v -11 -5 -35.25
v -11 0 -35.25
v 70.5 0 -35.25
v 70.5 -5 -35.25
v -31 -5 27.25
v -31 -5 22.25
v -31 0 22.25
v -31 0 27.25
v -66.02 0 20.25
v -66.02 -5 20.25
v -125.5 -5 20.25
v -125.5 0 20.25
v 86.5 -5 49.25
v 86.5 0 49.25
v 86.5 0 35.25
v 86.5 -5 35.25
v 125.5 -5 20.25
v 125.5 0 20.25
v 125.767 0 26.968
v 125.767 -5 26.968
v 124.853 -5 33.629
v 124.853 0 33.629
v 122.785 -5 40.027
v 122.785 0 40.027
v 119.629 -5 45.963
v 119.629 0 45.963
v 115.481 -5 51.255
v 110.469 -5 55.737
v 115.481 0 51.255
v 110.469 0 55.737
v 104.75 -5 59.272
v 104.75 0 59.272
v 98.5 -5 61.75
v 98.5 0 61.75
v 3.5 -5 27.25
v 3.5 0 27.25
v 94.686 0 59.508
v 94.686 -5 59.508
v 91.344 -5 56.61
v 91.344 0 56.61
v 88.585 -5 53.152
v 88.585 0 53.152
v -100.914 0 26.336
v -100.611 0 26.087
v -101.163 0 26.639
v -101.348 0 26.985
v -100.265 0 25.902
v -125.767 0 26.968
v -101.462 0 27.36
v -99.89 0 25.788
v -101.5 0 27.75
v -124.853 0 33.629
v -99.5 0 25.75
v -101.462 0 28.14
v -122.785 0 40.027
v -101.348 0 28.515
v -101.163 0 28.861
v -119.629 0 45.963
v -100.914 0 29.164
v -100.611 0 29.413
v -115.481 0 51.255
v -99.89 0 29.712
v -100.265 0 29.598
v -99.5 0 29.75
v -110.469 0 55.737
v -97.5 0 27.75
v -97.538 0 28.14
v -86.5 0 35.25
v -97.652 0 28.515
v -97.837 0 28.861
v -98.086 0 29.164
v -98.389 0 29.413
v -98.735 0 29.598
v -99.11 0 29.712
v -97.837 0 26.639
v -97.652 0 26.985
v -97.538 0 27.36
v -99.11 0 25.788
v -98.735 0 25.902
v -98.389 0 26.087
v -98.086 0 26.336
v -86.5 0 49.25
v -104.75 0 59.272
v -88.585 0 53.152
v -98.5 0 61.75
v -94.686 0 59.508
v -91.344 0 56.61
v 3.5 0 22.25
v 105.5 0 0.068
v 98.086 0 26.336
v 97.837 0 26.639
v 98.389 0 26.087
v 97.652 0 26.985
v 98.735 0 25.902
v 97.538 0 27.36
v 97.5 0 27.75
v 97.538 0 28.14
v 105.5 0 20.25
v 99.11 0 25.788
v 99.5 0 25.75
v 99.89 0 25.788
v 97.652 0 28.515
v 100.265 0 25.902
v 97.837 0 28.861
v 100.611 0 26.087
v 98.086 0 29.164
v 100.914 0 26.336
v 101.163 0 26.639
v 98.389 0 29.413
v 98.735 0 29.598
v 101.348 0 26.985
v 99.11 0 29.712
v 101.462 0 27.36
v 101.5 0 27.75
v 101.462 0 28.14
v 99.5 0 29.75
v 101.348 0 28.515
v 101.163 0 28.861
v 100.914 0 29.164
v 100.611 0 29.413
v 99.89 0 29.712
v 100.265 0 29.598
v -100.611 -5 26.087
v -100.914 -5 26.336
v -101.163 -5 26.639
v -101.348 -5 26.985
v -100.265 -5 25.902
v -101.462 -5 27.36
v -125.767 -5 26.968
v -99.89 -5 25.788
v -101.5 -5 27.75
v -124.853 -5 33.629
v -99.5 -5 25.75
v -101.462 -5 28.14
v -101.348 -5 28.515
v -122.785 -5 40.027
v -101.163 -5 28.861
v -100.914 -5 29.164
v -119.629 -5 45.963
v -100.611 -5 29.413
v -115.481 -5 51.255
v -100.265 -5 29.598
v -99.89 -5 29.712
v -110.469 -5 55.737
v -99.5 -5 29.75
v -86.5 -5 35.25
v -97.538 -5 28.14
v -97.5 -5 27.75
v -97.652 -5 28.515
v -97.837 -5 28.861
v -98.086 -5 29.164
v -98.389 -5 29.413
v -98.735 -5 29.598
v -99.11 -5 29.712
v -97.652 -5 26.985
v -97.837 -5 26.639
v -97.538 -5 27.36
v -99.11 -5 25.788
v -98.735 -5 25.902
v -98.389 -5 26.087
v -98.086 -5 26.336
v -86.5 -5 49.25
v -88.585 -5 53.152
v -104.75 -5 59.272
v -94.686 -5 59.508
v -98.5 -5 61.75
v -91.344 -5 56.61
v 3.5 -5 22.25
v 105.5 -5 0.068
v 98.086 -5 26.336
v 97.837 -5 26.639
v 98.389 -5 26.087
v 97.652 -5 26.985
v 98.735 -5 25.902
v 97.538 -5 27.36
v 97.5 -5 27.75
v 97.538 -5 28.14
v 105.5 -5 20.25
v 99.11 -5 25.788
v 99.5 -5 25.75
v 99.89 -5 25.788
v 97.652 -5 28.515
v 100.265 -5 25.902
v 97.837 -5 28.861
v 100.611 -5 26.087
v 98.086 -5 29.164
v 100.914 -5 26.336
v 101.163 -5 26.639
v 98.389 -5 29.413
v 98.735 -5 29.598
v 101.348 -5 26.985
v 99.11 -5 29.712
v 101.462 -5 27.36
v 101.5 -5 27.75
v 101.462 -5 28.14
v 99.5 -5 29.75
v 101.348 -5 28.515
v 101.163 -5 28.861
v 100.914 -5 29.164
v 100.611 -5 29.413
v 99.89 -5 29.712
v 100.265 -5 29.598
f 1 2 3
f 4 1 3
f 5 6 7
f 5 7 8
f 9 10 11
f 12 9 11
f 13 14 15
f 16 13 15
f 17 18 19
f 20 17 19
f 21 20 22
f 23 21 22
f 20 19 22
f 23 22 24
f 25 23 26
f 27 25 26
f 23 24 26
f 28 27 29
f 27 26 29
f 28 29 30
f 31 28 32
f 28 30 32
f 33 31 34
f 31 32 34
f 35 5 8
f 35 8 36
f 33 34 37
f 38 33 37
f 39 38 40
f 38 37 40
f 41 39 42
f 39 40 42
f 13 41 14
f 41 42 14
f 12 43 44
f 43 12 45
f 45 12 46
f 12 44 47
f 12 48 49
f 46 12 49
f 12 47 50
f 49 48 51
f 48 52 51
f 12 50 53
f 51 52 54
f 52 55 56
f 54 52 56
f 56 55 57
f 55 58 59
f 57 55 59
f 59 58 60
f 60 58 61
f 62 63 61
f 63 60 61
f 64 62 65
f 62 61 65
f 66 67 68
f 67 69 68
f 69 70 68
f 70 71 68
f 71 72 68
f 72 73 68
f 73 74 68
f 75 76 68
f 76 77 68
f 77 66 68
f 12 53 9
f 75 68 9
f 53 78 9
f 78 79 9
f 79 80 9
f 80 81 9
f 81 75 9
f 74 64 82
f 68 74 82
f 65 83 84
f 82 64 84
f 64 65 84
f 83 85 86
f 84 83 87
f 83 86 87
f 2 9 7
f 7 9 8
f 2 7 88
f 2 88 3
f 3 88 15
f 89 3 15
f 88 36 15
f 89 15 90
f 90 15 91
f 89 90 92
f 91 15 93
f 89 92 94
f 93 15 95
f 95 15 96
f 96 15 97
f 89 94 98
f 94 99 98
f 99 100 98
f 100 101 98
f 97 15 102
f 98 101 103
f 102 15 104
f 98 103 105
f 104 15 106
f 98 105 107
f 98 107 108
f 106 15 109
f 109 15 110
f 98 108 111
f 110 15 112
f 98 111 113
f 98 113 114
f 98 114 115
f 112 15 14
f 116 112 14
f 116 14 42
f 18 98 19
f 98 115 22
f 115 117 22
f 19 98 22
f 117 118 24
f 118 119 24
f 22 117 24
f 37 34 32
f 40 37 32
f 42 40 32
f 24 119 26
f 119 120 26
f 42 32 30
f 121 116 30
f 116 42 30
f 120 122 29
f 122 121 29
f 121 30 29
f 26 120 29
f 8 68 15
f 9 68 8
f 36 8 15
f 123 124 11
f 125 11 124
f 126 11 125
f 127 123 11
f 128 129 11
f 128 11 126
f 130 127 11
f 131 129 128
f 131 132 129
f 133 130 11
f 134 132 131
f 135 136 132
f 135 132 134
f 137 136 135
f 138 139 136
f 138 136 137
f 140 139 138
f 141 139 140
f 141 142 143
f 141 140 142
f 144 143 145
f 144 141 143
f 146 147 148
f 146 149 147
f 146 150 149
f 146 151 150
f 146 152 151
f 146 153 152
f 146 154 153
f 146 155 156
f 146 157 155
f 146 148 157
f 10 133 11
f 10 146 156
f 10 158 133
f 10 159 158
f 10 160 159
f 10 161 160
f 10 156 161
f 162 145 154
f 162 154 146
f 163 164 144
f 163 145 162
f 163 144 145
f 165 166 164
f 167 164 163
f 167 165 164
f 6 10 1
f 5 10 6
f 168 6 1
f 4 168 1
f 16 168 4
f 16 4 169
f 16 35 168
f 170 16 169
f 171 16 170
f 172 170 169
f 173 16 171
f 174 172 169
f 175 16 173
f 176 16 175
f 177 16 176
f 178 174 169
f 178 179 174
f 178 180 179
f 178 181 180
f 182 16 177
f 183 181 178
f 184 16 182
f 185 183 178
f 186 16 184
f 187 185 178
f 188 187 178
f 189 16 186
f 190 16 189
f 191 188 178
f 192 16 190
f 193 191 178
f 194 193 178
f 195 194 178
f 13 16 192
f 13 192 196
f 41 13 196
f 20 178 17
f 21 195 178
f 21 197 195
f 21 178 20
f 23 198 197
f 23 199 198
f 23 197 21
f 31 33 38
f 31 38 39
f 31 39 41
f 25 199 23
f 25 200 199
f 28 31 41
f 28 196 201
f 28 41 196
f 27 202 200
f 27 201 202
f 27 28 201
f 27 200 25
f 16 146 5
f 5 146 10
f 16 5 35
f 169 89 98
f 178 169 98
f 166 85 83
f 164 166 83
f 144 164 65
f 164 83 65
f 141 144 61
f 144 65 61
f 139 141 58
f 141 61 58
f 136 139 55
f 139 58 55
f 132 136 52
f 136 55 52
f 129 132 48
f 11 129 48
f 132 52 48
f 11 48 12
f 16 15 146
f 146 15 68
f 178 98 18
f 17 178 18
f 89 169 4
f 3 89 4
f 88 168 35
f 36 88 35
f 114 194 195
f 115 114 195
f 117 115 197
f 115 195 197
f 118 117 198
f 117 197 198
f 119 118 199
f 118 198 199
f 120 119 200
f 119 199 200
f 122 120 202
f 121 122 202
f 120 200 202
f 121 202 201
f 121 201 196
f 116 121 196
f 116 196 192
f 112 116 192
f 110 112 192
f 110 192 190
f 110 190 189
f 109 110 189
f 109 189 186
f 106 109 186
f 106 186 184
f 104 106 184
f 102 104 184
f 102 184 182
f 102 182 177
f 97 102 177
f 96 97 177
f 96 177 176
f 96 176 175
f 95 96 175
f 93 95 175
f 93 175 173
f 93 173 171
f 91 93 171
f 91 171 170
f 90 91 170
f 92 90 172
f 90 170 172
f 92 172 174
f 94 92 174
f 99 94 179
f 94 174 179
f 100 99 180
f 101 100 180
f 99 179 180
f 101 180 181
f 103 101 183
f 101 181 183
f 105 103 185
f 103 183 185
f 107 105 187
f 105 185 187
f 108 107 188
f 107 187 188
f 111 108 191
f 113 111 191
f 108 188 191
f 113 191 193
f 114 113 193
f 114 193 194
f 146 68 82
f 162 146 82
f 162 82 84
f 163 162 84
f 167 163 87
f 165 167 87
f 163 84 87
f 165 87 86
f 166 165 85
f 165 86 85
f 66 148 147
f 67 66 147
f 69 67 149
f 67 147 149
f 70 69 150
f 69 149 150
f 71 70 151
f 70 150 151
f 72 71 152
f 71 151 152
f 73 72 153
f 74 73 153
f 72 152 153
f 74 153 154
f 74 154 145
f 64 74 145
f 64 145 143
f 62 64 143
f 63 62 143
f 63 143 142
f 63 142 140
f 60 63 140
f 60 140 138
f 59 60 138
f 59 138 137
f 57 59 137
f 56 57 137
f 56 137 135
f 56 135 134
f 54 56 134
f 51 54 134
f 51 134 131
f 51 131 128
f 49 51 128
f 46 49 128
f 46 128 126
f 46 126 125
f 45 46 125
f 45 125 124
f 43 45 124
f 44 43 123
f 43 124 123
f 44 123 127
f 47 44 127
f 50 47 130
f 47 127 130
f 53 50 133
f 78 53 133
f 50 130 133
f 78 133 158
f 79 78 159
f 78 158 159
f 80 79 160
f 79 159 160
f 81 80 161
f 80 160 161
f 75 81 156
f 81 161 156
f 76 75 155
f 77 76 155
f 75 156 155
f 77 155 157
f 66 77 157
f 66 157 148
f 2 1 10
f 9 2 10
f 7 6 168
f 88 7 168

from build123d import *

# Parameters (mm, degrees)
F1_DEPTH = 5
F2_W     = 34.5
F2_H     = 5
F3_DEPTH = 25
F4_R     = 2
F5_DEPTH = 25


with BuildPart() as f1:
    # F0 (on Front) → F1 (new body)
    with BuildSketch(Plane.XZ):
        with BuildLine():
            Line((-105.5, 20.25), (-105.5, 35.25))
            Line((-105.5, 35.25), (-86.5, 35.25))
            Line((-86.5, 35.25), (-86.5, 49.25))
            ThreePointArc((-86.5, 49.25), (-91.344095, 56.609669), (-98.5, 61.75))
            ThreePointArc((-98.5, 61.75), (-119.628789, 45.963308), (-125.5, 20.25))
            Line((-125.5, 20.25), (-105.5, 20.25))
        make_face()
        Polygon((-86.5, 35.25), (-105.5, 35.25), (-105.5, 20.25), (-105.5, -35.25), (105.5, -35.25), (105.5, 20.25), (105.5, 35.25), (86.5, 35.25), align=None)
        with BuildLine():
            Line((86.5, 49.25), (86.5, 35.25))
            Line((86.5, 35.25), (105.5, 35.25))
            Line((105.5, 35.25), (105.5, 20.25))
            Line((105.5, 20.25), (125.5, 20.25))
            ThreePointArc((125.5, 20.25), (119.628789, 45.963308), (98.5, 61.75))
            ThreePointArc((98.5, 61.75), (91.344095, 56.609669), (86.5, 49.25))
        make_face()
    extrude(amount=F1_DEPTH)

    # F2 (on face) → F3 (cut)
    with BuildSketch(Plane.XZ.offset(5)):
        Polygon((125.5, 20.25), (70.5, -35.25), (119.704917, -35.25), align=None)
        Polygon((-105.5, -35.25), (-11, -35.25), (-66.019693, 20.25), (-105.5, 20.25), align=None)
        with Locations((-13.75, 24.75)):
            Rectangle(F2_W, F2_H)
    extrude(amount=-F3_DEPTH, mode=Mode.SUBTRACT)

    # F4 (on face) → F5 (cut)
    with BuildSketch(Plane.XZ.offset(5)):
        with Locations((-99.5, 27.75)):
            Circle(F4_R)
        with Locations((99.5, 27.75)):
            Circle(F4_R)
    extrude(amount=-F5_DEPTH, mode=Mode.SUBTRACT)


solid = f1.part
